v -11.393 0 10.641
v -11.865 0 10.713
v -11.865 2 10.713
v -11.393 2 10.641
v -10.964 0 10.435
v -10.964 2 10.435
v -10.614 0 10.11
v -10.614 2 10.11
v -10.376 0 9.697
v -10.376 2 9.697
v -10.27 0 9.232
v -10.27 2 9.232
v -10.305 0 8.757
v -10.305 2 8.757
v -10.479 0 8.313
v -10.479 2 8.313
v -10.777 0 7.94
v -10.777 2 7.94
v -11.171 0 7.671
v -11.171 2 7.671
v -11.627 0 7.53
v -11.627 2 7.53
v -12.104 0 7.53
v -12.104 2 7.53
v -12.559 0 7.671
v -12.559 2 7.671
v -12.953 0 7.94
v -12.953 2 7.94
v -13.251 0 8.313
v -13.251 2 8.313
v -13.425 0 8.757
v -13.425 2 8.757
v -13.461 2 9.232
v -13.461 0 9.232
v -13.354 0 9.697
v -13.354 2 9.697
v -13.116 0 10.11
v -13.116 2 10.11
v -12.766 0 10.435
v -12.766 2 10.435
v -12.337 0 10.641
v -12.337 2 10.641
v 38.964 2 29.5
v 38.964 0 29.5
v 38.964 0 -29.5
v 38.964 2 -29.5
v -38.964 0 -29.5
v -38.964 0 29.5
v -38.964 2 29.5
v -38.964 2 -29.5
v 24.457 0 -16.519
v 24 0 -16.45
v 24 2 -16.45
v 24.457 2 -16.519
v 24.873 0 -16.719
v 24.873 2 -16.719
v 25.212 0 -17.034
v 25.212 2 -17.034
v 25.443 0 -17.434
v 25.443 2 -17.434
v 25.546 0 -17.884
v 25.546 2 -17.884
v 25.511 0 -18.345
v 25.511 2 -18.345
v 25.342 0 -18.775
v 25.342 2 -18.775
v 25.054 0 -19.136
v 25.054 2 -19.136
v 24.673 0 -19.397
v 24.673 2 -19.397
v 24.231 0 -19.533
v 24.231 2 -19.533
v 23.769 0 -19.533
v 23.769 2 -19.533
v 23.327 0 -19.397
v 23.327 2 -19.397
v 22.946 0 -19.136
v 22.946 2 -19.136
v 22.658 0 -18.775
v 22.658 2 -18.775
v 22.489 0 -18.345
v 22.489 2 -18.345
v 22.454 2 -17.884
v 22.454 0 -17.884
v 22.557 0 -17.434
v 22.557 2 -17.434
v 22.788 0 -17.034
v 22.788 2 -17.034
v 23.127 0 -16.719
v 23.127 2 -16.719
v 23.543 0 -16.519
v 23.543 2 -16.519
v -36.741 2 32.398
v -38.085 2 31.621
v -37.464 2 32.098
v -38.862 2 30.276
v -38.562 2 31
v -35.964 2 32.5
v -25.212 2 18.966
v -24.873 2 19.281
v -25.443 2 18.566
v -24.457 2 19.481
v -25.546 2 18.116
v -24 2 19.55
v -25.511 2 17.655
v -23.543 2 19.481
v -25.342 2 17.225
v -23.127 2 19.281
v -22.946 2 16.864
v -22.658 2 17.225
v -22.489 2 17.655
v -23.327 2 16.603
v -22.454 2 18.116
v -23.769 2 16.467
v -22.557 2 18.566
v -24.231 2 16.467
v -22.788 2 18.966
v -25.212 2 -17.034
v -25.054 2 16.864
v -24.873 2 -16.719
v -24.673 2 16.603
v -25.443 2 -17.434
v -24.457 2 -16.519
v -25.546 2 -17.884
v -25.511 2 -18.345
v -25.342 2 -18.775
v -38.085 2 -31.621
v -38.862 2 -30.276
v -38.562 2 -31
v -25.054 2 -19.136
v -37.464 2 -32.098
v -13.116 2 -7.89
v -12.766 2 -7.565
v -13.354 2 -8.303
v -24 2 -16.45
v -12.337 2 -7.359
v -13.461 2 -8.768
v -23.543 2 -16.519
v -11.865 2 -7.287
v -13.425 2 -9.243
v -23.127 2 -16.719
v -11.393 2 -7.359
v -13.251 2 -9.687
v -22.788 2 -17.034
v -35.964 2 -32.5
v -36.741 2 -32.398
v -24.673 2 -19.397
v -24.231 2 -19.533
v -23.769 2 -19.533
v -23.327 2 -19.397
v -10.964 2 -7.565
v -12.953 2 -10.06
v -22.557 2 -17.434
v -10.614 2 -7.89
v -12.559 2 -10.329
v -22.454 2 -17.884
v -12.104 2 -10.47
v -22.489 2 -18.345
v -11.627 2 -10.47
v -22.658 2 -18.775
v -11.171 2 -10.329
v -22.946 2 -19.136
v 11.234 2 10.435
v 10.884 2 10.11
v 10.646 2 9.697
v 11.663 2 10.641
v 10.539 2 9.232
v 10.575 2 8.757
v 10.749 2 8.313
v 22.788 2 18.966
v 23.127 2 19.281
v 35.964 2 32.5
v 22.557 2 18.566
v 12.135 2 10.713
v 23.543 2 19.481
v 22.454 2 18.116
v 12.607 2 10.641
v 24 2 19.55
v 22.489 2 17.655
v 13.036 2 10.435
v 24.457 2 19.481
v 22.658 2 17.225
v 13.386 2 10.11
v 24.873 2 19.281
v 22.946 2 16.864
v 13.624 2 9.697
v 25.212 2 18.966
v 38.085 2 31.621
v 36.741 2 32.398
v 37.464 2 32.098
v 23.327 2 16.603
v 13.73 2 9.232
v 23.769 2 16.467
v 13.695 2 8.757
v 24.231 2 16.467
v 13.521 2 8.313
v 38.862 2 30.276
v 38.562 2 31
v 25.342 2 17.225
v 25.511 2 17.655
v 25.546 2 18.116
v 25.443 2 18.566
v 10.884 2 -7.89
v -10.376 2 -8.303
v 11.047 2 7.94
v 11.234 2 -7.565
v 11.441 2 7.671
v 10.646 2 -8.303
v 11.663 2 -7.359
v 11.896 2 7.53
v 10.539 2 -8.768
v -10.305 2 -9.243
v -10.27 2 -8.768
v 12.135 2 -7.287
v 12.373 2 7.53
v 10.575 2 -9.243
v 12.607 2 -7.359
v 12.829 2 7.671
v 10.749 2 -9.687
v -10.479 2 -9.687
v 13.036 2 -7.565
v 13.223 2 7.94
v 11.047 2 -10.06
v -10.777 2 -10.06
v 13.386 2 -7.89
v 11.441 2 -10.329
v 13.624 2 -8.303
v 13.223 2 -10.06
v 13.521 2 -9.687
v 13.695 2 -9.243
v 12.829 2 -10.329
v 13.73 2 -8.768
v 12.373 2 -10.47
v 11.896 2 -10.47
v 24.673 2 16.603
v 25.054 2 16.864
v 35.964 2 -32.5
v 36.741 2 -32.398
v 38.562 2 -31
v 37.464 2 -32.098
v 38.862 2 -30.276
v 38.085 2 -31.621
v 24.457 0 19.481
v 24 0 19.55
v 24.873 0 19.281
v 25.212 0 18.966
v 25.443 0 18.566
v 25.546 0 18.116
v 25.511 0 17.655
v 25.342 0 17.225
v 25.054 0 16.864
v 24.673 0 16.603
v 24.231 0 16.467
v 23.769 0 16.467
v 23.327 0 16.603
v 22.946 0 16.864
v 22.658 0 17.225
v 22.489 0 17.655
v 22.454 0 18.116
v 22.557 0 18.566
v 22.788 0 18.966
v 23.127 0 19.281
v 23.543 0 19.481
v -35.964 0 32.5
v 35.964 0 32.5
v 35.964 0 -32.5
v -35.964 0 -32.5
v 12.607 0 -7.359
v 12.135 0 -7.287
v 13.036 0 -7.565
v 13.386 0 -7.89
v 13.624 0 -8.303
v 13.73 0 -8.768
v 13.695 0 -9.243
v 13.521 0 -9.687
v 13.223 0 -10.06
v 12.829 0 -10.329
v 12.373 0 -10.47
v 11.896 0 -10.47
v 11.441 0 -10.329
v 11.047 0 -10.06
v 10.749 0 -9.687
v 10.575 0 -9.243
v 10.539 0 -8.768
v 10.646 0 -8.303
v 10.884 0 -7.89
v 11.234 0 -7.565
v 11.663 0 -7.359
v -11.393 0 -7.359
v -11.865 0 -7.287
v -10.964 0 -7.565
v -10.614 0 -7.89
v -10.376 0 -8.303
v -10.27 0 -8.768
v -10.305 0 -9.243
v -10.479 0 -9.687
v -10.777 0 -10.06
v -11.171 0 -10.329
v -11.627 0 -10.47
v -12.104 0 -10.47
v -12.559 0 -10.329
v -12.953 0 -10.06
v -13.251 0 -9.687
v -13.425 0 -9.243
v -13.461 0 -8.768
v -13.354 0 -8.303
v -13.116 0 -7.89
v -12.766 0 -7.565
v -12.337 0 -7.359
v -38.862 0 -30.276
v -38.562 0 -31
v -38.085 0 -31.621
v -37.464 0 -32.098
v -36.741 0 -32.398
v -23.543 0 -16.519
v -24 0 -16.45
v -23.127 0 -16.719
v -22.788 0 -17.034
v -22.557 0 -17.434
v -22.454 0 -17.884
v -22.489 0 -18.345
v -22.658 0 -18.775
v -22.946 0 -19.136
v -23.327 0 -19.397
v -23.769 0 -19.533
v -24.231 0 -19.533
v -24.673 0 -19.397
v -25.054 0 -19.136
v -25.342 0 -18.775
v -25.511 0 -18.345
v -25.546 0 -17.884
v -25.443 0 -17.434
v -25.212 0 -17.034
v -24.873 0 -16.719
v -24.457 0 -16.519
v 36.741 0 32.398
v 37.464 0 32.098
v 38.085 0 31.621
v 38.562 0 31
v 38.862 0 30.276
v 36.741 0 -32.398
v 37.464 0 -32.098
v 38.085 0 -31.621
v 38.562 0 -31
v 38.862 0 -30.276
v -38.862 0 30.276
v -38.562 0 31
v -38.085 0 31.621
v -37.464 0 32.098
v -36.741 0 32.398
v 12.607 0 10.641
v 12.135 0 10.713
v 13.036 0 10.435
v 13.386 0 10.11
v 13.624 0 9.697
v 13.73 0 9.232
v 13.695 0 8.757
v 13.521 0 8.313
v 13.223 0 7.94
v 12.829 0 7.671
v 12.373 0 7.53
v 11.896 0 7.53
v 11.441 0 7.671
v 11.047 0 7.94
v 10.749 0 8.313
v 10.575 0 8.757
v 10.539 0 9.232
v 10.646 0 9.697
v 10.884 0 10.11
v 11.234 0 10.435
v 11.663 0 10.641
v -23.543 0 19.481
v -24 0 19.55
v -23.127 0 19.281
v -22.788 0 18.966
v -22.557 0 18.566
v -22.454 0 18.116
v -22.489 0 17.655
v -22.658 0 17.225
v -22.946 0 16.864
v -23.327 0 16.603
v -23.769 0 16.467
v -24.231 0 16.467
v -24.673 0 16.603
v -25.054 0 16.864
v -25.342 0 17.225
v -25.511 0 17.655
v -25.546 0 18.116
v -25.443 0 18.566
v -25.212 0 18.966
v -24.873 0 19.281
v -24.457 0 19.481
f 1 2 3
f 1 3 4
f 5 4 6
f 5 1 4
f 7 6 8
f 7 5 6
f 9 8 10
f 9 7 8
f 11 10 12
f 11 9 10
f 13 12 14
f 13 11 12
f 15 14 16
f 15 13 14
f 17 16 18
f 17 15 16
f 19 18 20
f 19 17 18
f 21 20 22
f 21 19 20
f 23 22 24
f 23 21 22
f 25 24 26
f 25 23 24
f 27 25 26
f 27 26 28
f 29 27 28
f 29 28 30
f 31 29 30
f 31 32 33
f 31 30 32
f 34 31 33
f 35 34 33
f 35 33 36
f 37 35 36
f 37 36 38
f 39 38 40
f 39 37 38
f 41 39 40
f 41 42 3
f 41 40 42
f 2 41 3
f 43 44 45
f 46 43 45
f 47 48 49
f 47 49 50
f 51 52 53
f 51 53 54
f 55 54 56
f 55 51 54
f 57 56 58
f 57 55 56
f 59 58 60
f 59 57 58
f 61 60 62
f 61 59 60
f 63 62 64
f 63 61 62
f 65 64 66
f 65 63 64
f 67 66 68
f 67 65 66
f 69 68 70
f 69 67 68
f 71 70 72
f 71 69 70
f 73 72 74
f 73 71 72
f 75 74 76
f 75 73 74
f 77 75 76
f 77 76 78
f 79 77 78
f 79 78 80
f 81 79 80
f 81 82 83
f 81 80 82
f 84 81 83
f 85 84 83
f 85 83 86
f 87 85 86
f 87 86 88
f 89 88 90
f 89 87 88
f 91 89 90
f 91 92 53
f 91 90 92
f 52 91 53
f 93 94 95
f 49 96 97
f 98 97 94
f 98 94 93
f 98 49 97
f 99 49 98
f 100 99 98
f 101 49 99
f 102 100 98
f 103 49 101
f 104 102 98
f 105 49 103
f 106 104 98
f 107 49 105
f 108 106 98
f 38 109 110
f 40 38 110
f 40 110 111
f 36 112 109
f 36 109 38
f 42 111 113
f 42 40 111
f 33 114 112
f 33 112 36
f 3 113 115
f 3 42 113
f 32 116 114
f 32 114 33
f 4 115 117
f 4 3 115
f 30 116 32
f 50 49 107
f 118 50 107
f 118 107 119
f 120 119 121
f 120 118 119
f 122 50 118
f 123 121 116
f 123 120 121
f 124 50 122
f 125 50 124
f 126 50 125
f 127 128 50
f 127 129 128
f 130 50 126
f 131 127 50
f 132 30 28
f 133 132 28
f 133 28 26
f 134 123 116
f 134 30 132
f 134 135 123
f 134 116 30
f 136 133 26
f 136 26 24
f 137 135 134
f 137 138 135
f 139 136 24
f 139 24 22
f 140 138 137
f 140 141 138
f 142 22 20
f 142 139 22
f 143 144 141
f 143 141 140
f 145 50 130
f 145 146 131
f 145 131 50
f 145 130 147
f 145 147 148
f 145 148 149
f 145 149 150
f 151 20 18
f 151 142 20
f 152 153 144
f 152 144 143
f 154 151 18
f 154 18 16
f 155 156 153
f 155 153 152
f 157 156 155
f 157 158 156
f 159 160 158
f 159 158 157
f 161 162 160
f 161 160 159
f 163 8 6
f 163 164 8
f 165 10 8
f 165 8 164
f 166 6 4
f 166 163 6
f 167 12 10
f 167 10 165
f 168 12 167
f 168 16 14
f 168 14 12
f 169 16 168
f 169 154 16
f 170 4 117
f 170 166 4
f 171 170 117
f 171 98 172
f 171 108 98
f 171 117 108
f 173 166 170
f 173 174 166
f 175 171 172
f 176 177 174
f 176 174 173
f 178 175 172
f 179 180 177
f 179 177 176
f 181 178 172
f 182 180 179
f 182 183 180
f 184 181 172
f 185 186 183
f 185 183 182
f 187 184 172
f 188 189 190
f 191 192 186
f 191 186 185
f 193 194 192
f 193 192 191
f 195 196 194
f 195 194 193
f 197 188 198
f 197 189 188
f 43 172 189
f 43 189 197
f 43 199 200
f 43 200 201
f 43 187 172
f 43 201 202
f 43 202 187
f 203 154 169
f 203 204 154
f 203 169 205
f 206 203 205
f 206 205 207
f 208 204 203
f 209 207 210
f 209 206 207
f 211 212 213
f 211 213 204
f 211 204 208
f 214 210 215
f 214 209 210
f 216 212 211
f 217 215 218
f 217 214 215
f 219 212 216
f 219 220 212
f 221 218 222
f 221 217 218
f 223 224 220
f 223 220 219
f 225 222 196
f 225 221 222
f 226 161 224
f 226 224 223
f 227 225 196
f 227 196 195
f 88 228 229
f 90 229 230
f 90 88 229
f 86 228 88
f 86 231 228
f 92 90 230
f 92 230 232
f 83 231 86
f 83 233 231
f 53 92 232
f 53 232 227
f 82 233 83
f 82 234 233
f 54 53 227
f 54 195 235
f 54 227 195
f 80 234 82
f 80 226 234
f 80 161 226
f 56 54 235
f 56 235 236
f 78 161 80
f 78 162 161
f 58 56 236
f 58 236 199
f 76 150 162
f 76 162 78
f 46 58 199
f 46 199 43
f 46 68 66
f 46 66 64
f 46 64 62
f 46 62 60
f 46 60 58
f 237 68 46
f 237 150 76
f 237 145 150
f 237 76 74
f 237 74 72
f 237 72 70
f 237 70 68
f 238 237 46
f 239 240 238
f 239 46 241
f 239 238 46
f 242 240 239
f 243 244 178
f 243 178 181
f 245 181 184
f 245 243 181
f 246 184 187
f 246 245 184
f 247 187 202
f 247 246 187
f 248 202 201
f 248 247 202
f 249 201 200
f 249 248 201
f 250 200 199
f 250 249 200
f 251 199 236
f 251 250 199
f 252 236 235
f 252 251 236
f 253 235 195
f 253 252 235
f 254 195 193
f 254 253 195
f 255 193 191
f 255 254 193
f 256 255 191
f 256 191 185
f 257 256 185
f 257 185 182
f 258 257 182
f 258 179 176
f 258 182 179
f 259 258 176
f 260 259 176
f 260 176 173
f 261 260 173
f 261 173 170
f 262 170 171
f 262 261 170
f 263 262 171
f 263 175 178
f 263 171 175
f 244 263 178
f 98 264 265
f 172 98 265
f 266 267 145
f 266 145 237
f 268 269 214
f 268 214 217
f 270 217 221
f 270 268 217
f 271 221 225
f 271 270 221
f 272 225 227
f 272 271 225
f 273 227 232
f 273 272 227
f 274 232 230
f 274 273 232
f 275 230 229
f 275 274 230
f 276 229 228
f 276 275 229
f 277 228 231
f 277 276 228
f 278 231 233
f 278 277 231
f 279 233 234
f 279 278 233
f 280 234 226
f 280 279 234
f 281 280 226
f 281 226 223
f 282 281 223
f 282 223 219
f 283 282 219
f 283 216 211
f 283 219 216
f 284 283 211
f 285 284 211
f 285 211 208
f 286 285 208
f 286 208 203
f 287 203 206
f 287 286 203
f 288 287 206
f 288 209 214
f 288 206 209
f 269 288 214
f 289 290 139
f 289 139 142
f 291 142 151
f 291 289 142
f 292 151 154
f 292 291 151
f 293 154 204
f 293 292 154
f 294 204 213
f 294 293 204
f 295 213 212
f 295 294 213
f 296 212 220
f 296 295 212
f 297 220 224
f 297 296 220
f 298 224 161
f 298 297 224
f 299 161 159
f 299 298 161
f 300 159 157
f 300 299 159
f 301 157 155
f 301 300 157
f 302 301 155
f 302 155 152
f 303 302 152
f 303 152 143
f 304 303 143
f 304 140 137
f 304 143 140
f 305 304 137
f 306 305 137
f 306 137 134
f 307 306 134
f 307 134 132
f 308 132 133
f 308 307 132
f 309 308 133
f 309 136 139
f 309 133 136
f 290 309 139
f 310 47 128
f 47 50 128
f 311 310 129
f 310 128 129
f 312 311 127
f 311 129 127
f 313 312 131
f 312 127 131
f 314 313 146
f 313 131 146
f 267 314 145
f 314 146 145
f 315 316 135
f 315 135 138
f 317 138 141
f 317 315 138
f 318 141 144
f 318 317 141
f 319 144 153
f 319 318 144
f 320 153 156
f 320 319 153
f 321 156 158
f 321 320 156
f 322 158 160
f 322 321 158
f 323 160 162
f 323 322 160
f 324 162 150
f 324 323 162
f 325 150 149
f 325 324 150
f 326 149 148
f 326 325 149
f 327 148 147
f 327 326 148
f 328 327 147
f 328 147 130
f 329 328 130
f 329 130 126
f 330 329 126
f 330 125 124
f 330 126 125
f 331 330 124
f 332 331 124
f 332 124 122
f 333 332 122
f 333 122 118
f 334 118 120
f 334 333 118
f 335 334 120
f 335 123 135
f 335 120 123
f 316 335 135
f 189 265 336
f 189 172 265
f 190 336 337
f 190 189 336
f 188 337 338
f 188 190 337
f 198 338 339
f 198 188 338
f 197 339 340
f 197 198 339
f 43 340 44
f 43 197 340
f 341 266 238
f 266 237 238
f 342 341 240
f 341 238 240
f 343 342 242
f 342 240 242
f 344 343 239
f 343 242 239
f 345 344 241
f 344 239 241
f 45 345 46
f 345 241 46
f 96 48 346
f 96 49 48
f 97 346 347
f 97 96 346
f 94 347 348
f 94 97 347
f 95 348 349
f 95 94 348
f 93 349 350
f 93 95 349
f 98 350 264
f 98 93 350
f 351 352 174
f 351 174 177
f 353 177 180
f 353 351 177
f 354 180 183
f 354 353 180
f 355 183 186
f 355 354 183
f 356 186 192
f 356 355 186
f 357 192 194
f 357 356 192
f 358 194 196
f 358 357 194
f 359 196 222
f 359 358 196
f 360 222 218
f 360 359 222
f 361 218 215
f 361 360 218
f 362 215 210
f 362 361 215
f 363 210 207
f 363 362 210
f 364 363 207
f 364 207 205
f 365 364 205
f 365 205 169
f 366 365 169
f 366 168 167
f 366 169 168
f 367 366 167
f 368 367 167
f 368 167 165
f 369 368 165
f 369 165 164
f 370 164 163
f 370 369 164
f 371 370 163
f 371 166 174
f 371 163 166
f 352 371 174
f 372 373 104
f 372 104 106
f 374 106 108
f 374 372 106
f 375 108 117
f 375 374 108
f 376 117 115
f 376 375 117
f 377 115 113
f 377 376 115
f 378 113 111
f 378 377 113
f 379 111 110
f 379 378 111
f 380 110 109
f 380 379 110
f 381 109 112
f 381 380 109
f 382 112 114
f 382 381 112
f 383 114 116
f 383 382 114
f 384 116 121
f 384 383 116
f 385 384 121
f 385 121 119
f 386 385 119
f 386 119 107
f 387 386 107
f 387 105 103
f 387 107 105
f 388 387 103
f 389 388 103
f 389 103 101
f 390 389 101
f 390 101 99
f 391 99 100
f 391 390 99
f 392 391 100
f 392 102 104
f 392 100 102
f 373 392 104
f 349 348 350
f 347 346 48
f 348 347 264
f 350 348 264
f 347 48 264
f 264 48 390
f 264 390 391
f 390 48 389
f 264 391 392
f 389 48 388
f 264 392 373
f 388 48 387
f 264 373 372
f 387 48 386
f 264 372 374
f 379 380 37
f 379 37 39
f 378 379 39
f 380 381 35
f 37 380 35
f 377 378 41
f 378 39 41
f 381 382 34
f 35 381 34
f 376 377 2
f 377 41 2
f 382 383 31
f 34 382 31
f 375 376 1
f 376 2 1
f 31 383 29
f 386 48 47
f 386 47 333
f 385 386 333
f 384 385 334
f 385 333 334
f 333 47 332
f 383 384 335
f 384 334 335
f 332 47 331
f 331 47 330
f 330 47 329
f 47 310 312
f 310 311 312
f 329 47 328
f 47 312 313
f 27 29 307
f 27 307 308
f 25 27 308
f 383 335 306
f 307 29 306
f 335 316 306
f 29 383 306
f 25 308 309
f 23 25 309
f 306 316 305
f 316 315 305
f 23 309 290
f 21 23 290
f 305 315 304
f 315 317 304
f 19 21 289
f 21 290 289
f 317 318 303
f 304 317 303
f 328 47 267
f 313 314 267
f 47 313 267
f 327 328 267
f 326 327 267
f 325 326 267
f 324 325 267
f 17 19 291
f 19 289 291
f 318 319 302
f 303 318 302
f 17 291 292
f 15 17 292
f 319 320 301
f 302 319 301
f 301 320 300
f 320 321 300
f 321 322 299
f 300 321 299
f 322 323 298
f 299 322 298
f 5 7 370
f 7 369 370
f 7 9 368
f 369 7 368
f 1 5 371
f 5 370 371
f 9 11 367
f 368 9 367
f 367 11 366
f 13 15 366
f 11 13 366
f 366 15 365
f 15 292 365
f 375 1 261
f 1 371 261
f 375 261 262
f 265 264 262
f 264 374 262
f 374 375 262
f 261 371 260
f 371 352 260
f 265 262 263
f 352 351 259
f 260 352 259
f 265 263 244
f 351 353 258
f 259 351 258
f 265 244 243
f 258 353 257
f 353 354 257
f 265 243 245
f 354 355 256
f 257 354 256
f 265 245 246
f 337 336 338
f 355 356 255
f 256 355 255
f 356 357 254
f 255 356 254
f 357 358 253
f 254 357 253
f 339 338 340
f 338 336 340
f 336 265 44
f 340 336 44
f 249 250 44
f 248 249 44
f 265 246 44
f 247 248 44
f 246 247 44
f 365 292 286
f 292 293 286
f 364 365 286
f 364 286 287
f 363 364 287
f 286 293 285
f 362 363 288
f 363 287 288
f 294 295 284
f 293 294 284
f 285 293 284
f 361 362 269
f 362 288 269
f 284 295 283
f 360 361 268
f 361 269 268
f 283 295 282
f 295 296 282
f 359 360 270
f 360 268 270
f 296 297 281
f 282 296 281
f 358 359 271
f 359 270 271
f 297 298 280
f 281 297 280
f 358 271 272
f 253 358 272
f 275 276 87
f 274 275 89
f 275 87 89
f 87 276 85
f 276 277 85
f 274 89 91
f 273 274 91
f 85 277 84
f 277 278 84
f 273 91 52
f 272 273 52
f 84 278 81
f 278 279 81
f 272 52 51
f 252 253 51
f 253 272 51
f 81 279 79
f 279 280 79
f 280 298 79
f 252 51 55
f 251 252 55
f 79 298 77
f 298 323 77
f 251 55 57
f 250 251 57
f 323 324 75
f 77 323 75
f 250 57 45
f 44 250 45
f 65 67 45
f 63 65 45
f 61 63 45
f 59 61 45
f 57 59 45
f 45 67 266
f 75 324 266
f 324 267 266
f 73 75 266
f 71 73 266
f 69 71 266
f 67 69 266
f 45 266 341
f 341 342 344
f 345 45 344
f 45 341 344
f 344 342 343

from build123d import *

# Parameters (mm, degrees)
SKETCH1_W               = 77.928270256
SKETCH1_H               = 65
BOSS_EXTRUDE1_DEPTH     = 2
CUT_EXTRUDE3_DEPTH      = 51.778477983
CUT_EXTRUDE3_DEPTH_BACK = 51.778477983
SKETCH2_R               = 1.55
SKETCH2_R_2             = 1.6
FILLET1_R               = 3


with BuildPart() as part:
    # Sketch1 → Boss-Extrude1 (new body)
    with BuildSketch(Plane(origin=(0, 0, 0), x_dir=(1, 0, 0), z_dir=(0, 1, 0))):
        Rectangle(SKETCH1_W, SKETCH1_H)
    extrude(amount=BOSS_EXTRUDE1_DEPTH)

    # Sketch2 → Cut-Extrude3 (cut, two sides: drawn at the far end of the back side and taken through both)
    with BuildSketch(Plane(origin=(0, 2, 0), x_dir=(1, 0, 0), z_dir=(0, 1, 0)).offset(-CUT_EXTRUDE3_DEPTH_BACK)):
        with Locations(Location((-24, 18, 0), (0, 0, 270))):
            Circle(SKETCH2_R)
        with Locations(Location((24, 18, 0), (0, 0, 270))):
            Circle(SKETCH2_R)
        with Locations(Location((24, -18, 0), (0, 0, 270))):
            Circle(SKETCH2_R)
        with Locations(Location((-24, -18, 0), (0, 0, 270))):
            Circle(SKETCH2_R)
        with Locations(Location((-11.865042966, 8.887432286, 0), (0, 0, 270))):
            Circle(SKETCH2_R_2)
        with Locations(Location((12.134957034, 8.887432286, 0), (0, 0, 270))):
            Circle(SKETCH2_R_2)
        with Locations(Location((12.134957034, -9.112567714, 0), (0, 0, 270))):
            Circle(SKETCH2_R_2)
        with Locations(Location((-11.865042966, -9.112567714, 0), (0, 0, 270))):
            Circle(SKETCH2_R_2)
    extrude(amount=CUT_EXTRUDE3_DEPTH + CUT_EXTRUDE3_DEPTH_BACK, mode=Mode.SUBTRACT)

    # Fillet1
    fillet1_edges = [part.edges().sort_by_distance(p)[0] for p in [
        (-38.964135128, 1, 32.5),
        (38.964135128, 1, 32.5),
        (38.964135128, 1, -32.5),
        (-38.964135128, 1, -32.5),
    ]]
    fillet(fillet1_edges, radius=FILLET1_R)


solid = part.part
